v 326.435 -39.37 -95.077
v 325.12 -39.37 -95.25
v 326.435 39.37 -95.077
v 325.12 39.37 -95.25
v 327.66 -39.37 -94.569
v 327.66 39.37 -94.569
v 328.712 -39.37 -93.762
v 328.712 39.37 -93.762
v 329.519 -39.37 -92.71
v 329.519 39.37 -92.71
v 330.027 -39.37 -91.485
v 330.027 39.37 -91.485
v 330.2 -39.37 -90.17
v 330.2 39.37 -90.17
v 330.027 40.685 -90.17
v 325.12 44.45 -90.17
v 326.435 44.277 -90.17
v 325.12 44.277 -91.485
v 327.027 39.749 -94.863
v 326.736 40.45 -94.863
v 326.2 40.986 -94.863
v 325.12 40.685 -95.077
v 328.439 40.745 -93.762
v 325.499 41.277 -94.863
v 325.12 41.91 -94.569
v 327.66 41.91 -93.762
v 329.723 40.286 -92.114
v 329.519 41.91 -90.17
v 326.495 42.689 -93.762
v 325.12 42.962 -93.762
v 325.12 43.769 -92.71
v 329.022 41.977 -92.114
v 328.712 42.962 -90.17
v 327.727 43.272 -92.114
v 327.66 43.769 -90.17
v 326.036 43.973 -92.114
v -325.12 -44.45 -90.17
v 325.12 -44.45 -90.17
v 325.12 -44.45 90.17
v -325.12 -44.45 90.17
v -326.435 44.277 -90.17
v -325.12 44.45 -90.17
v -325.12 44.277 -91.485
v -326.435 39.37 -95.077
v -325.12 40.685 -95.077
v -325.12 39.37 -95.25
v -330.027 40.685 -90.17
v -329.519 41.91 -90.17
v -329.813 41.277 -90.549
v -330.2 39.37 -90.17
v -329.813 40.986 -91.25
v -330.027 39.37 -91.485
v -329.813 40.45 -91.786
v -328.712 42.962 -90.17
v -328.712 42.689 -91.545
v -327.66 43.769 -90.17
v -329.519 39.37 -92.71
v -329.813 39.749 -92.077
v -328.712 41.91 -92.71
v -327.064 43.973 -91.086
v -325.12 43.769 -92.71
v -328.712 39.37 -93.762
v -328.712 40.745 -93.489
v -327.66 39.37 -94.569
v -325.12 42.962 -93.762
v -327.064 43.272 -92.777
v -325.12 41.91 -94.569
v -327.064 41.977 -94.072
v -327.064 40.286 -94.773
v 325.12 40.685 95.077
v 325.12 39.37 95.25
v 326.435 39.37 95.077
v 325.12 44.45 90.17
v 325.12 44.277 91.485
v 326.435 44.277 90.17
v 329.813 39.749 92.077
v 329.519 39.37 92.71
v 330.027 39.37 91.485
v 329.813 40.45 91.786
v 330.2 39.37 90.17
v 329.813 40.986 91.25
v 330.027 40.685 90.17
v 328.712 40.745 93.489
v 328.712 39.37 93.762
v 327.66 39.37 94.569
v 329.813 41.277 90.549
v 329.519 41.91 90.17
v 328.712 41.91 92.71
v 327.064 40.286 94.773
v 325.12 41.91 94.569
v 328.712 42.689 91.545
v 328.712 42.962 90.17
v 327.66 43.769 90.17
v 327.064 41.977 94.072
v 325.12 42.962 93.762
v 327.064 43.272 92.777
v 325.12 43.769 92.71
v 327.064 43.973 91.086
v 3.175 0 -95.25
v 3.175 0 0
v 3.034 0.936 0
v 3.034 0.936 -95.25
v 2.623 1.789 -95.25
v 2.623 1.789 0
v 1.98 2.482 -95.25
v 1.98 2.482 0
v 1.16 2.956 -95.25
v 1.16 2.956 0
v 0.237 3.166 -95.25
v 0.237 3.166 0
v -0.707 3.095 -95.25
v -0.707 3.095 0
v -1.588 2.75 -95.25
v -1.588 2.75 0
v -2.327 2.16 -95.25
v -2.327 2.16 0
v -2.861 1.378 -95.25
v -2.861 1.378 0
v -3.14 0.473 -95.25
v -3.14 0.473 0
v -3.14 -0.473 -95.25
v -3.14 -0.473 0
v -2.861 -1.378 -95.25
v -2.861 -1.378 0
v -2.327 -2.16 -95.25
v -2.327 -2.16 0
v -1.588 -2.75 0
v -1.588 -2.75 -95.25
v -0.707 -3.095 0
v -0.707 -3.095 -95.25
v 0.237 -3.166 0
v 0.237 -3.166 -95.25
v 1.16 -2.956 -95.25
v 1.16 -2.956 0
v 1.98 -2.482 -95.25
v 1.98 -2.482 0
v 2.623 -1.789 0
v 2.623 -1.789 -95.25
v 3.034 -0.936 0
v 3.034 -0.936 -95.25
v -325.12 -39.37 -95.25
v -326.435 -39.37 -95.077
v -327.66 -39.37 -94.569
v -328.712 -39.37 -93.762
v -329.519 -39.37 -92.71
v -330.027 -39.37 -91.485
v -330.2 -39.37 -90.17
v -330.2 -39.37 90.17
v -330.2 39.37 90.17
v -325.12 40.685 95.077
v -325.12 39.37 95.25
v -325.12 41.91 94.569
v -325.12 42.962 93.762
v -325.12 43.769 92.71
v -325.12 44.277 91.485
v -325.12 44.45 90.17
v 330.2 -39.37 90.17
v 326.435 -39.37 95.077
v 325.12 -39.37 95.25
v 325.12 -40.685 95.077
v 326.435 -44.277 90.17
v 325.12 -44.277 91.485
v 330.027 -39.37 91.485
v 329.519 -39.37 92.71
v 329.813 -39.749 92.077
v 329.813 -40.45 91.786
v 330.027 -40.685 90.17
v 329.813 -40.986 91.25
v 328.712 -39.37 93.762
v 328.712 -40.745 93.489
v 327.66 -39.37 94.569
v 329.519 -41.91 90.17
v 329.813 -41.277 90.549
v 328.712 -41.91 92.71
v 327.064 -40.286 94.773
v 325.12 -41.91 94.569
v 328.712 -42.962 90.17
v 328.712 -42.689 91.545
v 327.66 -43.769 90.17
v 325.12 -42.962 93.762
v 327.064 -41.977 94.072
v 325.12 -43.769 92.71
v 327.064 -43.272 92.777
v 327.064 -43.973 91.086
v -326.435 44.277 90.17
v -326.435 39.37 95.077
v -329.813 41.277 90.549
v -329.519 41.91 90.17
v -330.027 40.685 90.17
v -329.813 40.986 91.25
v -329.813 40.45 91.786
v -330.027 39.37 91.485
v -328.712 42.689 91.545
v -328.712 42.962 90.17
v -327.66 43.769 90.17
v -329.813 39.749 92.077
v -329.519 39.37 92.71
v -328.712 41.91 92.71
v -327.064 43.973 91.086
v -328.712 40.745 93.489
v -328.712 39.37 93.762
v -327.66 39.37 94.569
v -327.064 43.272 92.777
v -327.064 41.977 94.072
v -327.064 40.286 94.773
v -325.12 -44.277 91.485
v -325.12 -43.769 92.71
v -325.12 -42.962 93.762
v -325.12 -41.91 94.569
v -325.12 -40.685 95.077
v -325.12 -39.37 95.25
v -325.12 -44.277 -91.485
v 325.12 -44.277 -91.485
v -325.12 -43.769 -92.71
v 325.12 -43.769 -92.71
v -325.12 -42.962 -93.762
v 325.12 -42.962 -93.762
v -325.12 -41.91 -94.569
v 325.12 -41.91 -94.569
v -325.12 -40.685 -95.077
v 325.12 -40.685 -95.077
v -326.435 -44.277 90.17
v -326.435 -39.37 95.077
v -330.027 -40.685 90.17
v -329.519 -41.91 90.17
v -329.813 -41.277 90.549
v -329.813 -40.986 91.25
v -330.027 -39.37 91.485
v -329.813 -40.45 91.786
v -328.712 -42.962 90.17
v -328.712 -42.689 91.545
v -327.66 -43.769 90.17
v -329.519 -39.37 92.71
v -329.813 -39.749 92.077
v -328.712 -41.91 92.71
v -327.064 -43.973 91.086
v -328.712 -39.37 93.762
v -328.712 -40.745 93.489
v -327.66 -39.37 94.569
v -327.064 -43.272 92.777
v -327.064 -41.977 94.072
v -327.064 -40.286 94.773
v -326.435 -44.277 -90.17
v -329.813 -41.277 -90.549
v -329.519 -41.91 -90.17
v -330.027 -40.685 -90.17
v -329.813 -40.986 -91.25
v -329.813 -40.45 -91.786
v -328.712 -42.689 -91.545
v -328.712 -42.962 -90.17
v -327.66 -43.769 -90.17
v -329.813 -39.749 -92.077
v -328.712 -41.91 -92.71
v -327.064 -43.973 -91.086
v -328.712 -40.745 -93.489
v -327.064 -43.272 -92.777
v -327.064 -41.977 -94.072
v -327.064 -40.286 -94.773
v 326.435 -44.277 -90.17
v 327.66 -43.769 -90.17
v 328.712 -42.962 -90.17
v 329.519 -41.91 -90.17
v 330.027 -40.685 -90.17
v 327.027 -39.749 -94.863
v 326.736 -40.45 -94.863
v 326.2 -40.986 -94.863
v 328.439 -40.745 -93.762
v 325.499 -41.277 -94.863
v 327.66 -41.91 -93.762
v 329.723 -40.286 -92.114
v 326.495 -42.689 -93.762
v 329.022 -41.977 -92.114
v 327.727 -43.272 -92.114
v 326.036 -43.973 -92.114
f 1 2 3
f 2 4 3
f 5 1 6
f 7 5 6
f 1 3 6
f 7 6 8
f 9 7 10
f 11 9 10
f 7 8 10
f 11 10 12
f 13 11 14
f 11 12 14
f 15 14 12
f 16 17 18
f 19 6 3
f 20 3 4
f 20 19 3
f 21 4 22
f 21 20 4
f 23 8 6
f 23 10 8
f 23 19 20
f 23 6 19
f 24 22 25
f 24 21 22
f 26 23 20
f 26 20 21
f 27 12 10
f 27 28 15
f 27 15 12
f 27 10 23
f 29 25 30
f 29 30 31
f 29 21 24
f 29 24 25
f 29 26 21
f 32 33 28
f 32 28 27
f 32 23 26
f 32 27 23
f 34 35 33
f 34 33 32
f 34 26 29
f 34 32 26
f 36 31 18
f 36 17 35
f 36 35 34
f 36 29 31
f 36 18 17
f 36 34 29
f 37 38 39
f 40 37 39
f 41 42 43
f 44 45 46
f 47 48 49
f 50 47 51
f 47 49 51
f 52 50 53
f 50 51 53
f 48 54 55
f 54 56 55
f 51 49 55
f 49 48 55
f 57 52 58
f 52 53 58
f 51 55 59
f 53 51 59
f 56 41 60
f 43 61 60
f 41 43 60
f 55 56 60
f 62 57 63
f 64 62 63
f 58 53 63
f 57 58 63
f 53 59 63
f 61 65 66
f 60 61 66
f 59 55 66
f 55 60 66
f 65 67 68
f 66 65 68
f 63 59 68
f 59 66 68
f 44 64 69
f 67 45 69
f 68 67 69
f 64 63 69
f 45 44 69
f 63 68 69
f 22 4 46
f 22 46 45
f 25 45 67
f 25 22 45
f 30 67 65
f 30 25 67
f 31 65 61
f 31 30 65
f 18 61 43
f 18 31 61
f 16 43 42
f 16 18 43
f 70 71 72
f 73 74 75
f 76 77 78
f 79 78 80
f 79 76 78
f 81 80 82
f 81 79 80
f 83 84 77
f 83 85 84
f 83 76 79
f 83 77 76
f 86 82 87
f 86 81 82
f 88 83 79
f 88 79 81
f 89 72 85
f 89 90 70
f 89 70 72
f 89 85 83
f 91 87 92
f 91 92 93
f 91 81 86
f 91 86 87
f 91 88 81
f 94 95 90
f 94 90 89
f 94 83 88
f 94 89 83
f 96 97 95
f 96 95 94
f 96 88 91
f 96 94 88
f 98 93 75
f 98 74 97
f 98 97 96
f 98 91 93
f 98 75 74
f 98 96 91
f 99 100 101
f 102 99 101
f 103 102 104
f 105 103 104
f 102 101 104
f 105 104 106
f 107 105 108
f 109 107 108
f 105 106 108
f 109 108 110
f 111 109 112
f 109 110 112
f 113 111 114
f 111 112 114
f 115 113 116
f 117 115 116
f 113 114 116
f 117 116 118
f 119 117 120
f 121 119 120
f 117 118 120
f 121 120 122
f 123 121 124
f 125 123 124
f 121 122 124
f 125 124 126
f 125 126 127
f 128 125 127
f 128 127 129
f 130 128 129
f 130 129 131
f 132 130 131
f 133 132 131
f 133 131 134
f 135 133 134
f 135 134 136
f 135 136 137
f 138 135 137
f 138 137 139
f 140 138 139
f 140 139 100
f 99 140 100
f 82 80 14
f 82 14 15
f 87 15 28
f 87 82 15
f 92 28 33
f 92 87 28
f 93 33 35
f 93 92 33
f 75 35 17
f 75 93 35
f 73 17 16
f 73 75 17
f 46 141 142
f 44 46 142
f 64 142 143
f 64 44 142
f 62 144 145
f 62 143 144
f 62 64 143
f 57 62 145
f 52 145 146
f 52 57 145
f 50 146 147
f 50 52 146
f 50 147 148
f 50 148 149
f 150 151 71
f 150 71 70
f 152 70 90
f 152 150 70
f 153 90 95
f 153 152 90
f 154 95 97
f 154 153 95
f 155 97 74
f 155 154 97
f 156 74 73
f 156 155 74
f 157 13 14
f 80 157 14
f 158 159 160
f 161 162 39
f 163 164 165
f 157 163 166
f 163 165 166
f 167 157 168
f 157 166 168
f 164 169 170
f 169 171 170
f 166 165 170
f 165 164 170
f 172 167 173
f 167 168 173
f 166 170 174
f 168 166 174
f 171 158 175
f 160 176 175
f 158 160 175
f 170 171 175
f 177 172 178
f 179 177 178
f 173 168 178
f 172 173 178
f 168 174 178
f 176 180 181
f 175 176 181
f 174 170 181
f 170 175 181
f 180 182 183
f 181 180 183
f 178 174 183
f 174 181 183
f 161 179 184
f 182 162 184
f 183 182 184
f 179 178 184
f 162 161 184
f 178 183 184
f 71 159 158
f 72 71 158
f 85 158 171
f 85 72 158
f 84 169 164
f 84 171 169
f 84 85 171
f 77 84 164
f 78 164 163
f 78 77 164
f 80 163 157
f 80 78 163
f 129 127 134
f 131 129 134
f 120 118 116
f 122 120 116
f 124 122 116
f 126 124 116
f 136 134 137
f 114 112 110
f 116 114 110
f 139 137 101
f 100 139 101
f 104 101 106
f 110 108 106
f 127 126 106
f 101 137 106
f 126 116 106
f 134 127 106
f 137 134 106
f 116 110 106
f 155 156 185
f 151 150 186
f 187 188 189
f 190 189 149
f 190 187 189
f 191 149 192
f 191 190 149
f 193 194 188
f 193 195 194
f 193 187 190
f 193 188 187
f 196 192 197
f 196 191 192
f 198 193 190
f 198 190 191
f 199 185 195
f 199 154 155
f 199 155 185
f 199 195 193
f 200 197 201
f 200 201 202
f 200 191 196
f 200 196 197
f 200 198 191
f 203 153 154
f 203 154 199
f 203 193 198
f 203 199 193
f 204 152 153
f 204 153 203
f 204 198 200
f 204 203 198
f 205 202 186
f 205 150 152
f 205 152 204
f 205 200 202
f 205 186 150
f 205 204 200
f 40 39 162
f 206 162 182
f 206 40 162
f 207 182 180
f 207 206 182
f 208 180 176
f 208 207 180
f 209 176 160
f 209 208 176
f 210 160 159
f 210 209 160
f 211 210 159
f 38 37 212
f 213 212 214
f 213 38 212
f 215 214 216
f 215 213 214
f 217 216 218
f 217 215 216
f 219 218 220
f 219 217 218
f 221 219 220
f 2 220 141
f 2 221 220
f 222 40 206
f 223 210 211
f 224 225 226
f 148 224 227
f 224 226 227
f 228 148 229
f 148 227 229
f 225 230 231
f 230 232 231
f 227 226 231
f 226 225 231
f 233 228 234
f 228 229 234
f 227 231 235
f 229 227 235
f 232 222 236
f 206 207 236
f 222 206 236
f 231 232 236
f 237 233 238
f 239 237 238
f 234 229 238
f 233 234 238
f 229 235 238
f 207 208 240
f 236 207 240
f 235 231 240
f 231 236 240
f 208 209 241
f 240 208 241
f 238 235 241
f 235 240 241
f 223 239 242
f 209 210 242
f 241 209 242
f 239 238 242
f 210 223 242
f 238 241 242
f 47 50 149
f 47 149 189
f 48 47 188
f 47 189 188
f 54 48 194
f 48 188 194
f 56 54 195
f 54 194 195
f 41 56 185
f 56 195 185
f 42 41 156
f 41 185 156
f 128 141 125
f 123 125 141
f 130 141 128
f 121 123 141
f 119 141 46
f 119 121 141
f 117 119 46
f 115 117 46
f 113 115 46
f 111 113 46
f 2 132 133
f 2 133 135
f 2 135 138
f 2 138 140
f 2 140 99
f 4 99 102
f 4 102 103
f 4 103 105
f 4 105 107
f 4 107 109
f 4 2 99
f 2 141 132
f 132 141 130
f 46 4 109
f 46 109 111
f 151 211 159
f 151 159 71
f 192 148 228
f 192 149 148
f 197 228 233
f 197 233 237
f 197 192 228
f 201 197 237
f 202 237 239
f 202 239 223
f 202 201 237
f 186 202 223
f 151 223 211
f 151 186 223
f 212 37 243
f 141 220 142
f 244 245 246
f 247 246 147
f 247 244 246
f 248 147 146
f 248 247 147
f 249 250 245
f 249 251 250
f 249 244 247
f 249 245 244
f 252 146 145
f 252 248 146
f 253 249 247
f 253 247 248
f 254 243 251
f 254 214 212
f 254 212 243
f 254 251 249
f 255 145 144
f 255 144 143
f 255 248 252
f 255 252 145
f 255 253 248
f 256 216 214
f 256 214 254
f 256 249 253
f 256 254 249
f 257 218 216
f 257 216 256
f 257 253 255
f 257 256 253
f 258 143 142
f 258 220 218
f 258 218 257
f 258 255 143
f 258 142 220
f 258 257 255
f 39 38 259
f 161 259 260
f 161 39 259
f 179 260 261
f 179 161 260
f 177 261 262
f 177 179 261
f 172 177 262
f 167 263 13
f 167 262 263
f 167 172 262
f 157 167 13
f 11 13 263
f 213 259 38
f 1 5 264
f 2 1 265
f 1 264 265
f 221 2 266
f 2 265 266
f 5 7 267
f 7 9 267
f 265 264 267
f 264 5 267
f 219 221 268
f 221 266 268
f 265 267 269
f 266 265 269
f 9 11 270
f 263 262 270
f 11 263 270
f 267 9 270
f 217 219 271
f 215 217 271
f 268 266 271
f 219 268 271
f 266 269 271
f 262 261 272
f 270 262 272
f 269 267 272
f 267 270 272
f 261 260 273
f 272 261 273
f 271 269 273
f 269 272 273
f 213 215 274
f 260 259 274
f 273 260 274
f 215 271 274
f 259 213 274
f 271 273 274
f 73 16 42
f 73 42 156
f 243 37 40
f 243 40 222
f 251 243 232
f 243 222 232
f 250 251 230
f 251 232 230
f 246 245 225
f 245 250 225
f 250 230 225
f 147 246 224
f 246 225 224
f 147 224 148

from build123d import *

# Parameters (mm, degrees)
F0_W     = 88.9
F0_H     = 190.5
F1_DEPTH = 330.2
F3_D     = 6.35
F3_DEPTH = 95.251
F4_R     = 5.08


with BuildPart() as f1:
    # F0 (on Right) → F1 (new body, symmetric)
    with BuildSketch(Plane.YZ):
        Rectangle(F0_W, F0_H)
    extrude(amount=F1_DEPTH, both=True)

    # F3 (through all, one way)
    with BuildSketch(Plane.XY):
        with Locations((0, 0)):
            Circle(F3_D / 2)
    extrude(amount=-F3_DEPTH, mode=Mode.SUBTRACT)

    # F4
    f4_edges = [f1.edges().sort_by_distance(p)[0] for p in [
        (0, -44.45, 95.25),
        (0, 44.45, 95.25),
        (330.2, 0, 95.25),
        (330.2, 44.45, 0),
        (330.2, -44.45, 0),
        (330.2, 0, -95.25),
        (0, -44.45, -95.25),
        (0, 44.45, -95.25),
        (-330.2, -44.45, 0),
        (-330.2, 44.45, 0),
        (-330.2, 0, 95.25),
        (-330.2, 0, -95.25),
    ]]
    fillet(f4_edges, radius=F4_R)


solid = f1.part
